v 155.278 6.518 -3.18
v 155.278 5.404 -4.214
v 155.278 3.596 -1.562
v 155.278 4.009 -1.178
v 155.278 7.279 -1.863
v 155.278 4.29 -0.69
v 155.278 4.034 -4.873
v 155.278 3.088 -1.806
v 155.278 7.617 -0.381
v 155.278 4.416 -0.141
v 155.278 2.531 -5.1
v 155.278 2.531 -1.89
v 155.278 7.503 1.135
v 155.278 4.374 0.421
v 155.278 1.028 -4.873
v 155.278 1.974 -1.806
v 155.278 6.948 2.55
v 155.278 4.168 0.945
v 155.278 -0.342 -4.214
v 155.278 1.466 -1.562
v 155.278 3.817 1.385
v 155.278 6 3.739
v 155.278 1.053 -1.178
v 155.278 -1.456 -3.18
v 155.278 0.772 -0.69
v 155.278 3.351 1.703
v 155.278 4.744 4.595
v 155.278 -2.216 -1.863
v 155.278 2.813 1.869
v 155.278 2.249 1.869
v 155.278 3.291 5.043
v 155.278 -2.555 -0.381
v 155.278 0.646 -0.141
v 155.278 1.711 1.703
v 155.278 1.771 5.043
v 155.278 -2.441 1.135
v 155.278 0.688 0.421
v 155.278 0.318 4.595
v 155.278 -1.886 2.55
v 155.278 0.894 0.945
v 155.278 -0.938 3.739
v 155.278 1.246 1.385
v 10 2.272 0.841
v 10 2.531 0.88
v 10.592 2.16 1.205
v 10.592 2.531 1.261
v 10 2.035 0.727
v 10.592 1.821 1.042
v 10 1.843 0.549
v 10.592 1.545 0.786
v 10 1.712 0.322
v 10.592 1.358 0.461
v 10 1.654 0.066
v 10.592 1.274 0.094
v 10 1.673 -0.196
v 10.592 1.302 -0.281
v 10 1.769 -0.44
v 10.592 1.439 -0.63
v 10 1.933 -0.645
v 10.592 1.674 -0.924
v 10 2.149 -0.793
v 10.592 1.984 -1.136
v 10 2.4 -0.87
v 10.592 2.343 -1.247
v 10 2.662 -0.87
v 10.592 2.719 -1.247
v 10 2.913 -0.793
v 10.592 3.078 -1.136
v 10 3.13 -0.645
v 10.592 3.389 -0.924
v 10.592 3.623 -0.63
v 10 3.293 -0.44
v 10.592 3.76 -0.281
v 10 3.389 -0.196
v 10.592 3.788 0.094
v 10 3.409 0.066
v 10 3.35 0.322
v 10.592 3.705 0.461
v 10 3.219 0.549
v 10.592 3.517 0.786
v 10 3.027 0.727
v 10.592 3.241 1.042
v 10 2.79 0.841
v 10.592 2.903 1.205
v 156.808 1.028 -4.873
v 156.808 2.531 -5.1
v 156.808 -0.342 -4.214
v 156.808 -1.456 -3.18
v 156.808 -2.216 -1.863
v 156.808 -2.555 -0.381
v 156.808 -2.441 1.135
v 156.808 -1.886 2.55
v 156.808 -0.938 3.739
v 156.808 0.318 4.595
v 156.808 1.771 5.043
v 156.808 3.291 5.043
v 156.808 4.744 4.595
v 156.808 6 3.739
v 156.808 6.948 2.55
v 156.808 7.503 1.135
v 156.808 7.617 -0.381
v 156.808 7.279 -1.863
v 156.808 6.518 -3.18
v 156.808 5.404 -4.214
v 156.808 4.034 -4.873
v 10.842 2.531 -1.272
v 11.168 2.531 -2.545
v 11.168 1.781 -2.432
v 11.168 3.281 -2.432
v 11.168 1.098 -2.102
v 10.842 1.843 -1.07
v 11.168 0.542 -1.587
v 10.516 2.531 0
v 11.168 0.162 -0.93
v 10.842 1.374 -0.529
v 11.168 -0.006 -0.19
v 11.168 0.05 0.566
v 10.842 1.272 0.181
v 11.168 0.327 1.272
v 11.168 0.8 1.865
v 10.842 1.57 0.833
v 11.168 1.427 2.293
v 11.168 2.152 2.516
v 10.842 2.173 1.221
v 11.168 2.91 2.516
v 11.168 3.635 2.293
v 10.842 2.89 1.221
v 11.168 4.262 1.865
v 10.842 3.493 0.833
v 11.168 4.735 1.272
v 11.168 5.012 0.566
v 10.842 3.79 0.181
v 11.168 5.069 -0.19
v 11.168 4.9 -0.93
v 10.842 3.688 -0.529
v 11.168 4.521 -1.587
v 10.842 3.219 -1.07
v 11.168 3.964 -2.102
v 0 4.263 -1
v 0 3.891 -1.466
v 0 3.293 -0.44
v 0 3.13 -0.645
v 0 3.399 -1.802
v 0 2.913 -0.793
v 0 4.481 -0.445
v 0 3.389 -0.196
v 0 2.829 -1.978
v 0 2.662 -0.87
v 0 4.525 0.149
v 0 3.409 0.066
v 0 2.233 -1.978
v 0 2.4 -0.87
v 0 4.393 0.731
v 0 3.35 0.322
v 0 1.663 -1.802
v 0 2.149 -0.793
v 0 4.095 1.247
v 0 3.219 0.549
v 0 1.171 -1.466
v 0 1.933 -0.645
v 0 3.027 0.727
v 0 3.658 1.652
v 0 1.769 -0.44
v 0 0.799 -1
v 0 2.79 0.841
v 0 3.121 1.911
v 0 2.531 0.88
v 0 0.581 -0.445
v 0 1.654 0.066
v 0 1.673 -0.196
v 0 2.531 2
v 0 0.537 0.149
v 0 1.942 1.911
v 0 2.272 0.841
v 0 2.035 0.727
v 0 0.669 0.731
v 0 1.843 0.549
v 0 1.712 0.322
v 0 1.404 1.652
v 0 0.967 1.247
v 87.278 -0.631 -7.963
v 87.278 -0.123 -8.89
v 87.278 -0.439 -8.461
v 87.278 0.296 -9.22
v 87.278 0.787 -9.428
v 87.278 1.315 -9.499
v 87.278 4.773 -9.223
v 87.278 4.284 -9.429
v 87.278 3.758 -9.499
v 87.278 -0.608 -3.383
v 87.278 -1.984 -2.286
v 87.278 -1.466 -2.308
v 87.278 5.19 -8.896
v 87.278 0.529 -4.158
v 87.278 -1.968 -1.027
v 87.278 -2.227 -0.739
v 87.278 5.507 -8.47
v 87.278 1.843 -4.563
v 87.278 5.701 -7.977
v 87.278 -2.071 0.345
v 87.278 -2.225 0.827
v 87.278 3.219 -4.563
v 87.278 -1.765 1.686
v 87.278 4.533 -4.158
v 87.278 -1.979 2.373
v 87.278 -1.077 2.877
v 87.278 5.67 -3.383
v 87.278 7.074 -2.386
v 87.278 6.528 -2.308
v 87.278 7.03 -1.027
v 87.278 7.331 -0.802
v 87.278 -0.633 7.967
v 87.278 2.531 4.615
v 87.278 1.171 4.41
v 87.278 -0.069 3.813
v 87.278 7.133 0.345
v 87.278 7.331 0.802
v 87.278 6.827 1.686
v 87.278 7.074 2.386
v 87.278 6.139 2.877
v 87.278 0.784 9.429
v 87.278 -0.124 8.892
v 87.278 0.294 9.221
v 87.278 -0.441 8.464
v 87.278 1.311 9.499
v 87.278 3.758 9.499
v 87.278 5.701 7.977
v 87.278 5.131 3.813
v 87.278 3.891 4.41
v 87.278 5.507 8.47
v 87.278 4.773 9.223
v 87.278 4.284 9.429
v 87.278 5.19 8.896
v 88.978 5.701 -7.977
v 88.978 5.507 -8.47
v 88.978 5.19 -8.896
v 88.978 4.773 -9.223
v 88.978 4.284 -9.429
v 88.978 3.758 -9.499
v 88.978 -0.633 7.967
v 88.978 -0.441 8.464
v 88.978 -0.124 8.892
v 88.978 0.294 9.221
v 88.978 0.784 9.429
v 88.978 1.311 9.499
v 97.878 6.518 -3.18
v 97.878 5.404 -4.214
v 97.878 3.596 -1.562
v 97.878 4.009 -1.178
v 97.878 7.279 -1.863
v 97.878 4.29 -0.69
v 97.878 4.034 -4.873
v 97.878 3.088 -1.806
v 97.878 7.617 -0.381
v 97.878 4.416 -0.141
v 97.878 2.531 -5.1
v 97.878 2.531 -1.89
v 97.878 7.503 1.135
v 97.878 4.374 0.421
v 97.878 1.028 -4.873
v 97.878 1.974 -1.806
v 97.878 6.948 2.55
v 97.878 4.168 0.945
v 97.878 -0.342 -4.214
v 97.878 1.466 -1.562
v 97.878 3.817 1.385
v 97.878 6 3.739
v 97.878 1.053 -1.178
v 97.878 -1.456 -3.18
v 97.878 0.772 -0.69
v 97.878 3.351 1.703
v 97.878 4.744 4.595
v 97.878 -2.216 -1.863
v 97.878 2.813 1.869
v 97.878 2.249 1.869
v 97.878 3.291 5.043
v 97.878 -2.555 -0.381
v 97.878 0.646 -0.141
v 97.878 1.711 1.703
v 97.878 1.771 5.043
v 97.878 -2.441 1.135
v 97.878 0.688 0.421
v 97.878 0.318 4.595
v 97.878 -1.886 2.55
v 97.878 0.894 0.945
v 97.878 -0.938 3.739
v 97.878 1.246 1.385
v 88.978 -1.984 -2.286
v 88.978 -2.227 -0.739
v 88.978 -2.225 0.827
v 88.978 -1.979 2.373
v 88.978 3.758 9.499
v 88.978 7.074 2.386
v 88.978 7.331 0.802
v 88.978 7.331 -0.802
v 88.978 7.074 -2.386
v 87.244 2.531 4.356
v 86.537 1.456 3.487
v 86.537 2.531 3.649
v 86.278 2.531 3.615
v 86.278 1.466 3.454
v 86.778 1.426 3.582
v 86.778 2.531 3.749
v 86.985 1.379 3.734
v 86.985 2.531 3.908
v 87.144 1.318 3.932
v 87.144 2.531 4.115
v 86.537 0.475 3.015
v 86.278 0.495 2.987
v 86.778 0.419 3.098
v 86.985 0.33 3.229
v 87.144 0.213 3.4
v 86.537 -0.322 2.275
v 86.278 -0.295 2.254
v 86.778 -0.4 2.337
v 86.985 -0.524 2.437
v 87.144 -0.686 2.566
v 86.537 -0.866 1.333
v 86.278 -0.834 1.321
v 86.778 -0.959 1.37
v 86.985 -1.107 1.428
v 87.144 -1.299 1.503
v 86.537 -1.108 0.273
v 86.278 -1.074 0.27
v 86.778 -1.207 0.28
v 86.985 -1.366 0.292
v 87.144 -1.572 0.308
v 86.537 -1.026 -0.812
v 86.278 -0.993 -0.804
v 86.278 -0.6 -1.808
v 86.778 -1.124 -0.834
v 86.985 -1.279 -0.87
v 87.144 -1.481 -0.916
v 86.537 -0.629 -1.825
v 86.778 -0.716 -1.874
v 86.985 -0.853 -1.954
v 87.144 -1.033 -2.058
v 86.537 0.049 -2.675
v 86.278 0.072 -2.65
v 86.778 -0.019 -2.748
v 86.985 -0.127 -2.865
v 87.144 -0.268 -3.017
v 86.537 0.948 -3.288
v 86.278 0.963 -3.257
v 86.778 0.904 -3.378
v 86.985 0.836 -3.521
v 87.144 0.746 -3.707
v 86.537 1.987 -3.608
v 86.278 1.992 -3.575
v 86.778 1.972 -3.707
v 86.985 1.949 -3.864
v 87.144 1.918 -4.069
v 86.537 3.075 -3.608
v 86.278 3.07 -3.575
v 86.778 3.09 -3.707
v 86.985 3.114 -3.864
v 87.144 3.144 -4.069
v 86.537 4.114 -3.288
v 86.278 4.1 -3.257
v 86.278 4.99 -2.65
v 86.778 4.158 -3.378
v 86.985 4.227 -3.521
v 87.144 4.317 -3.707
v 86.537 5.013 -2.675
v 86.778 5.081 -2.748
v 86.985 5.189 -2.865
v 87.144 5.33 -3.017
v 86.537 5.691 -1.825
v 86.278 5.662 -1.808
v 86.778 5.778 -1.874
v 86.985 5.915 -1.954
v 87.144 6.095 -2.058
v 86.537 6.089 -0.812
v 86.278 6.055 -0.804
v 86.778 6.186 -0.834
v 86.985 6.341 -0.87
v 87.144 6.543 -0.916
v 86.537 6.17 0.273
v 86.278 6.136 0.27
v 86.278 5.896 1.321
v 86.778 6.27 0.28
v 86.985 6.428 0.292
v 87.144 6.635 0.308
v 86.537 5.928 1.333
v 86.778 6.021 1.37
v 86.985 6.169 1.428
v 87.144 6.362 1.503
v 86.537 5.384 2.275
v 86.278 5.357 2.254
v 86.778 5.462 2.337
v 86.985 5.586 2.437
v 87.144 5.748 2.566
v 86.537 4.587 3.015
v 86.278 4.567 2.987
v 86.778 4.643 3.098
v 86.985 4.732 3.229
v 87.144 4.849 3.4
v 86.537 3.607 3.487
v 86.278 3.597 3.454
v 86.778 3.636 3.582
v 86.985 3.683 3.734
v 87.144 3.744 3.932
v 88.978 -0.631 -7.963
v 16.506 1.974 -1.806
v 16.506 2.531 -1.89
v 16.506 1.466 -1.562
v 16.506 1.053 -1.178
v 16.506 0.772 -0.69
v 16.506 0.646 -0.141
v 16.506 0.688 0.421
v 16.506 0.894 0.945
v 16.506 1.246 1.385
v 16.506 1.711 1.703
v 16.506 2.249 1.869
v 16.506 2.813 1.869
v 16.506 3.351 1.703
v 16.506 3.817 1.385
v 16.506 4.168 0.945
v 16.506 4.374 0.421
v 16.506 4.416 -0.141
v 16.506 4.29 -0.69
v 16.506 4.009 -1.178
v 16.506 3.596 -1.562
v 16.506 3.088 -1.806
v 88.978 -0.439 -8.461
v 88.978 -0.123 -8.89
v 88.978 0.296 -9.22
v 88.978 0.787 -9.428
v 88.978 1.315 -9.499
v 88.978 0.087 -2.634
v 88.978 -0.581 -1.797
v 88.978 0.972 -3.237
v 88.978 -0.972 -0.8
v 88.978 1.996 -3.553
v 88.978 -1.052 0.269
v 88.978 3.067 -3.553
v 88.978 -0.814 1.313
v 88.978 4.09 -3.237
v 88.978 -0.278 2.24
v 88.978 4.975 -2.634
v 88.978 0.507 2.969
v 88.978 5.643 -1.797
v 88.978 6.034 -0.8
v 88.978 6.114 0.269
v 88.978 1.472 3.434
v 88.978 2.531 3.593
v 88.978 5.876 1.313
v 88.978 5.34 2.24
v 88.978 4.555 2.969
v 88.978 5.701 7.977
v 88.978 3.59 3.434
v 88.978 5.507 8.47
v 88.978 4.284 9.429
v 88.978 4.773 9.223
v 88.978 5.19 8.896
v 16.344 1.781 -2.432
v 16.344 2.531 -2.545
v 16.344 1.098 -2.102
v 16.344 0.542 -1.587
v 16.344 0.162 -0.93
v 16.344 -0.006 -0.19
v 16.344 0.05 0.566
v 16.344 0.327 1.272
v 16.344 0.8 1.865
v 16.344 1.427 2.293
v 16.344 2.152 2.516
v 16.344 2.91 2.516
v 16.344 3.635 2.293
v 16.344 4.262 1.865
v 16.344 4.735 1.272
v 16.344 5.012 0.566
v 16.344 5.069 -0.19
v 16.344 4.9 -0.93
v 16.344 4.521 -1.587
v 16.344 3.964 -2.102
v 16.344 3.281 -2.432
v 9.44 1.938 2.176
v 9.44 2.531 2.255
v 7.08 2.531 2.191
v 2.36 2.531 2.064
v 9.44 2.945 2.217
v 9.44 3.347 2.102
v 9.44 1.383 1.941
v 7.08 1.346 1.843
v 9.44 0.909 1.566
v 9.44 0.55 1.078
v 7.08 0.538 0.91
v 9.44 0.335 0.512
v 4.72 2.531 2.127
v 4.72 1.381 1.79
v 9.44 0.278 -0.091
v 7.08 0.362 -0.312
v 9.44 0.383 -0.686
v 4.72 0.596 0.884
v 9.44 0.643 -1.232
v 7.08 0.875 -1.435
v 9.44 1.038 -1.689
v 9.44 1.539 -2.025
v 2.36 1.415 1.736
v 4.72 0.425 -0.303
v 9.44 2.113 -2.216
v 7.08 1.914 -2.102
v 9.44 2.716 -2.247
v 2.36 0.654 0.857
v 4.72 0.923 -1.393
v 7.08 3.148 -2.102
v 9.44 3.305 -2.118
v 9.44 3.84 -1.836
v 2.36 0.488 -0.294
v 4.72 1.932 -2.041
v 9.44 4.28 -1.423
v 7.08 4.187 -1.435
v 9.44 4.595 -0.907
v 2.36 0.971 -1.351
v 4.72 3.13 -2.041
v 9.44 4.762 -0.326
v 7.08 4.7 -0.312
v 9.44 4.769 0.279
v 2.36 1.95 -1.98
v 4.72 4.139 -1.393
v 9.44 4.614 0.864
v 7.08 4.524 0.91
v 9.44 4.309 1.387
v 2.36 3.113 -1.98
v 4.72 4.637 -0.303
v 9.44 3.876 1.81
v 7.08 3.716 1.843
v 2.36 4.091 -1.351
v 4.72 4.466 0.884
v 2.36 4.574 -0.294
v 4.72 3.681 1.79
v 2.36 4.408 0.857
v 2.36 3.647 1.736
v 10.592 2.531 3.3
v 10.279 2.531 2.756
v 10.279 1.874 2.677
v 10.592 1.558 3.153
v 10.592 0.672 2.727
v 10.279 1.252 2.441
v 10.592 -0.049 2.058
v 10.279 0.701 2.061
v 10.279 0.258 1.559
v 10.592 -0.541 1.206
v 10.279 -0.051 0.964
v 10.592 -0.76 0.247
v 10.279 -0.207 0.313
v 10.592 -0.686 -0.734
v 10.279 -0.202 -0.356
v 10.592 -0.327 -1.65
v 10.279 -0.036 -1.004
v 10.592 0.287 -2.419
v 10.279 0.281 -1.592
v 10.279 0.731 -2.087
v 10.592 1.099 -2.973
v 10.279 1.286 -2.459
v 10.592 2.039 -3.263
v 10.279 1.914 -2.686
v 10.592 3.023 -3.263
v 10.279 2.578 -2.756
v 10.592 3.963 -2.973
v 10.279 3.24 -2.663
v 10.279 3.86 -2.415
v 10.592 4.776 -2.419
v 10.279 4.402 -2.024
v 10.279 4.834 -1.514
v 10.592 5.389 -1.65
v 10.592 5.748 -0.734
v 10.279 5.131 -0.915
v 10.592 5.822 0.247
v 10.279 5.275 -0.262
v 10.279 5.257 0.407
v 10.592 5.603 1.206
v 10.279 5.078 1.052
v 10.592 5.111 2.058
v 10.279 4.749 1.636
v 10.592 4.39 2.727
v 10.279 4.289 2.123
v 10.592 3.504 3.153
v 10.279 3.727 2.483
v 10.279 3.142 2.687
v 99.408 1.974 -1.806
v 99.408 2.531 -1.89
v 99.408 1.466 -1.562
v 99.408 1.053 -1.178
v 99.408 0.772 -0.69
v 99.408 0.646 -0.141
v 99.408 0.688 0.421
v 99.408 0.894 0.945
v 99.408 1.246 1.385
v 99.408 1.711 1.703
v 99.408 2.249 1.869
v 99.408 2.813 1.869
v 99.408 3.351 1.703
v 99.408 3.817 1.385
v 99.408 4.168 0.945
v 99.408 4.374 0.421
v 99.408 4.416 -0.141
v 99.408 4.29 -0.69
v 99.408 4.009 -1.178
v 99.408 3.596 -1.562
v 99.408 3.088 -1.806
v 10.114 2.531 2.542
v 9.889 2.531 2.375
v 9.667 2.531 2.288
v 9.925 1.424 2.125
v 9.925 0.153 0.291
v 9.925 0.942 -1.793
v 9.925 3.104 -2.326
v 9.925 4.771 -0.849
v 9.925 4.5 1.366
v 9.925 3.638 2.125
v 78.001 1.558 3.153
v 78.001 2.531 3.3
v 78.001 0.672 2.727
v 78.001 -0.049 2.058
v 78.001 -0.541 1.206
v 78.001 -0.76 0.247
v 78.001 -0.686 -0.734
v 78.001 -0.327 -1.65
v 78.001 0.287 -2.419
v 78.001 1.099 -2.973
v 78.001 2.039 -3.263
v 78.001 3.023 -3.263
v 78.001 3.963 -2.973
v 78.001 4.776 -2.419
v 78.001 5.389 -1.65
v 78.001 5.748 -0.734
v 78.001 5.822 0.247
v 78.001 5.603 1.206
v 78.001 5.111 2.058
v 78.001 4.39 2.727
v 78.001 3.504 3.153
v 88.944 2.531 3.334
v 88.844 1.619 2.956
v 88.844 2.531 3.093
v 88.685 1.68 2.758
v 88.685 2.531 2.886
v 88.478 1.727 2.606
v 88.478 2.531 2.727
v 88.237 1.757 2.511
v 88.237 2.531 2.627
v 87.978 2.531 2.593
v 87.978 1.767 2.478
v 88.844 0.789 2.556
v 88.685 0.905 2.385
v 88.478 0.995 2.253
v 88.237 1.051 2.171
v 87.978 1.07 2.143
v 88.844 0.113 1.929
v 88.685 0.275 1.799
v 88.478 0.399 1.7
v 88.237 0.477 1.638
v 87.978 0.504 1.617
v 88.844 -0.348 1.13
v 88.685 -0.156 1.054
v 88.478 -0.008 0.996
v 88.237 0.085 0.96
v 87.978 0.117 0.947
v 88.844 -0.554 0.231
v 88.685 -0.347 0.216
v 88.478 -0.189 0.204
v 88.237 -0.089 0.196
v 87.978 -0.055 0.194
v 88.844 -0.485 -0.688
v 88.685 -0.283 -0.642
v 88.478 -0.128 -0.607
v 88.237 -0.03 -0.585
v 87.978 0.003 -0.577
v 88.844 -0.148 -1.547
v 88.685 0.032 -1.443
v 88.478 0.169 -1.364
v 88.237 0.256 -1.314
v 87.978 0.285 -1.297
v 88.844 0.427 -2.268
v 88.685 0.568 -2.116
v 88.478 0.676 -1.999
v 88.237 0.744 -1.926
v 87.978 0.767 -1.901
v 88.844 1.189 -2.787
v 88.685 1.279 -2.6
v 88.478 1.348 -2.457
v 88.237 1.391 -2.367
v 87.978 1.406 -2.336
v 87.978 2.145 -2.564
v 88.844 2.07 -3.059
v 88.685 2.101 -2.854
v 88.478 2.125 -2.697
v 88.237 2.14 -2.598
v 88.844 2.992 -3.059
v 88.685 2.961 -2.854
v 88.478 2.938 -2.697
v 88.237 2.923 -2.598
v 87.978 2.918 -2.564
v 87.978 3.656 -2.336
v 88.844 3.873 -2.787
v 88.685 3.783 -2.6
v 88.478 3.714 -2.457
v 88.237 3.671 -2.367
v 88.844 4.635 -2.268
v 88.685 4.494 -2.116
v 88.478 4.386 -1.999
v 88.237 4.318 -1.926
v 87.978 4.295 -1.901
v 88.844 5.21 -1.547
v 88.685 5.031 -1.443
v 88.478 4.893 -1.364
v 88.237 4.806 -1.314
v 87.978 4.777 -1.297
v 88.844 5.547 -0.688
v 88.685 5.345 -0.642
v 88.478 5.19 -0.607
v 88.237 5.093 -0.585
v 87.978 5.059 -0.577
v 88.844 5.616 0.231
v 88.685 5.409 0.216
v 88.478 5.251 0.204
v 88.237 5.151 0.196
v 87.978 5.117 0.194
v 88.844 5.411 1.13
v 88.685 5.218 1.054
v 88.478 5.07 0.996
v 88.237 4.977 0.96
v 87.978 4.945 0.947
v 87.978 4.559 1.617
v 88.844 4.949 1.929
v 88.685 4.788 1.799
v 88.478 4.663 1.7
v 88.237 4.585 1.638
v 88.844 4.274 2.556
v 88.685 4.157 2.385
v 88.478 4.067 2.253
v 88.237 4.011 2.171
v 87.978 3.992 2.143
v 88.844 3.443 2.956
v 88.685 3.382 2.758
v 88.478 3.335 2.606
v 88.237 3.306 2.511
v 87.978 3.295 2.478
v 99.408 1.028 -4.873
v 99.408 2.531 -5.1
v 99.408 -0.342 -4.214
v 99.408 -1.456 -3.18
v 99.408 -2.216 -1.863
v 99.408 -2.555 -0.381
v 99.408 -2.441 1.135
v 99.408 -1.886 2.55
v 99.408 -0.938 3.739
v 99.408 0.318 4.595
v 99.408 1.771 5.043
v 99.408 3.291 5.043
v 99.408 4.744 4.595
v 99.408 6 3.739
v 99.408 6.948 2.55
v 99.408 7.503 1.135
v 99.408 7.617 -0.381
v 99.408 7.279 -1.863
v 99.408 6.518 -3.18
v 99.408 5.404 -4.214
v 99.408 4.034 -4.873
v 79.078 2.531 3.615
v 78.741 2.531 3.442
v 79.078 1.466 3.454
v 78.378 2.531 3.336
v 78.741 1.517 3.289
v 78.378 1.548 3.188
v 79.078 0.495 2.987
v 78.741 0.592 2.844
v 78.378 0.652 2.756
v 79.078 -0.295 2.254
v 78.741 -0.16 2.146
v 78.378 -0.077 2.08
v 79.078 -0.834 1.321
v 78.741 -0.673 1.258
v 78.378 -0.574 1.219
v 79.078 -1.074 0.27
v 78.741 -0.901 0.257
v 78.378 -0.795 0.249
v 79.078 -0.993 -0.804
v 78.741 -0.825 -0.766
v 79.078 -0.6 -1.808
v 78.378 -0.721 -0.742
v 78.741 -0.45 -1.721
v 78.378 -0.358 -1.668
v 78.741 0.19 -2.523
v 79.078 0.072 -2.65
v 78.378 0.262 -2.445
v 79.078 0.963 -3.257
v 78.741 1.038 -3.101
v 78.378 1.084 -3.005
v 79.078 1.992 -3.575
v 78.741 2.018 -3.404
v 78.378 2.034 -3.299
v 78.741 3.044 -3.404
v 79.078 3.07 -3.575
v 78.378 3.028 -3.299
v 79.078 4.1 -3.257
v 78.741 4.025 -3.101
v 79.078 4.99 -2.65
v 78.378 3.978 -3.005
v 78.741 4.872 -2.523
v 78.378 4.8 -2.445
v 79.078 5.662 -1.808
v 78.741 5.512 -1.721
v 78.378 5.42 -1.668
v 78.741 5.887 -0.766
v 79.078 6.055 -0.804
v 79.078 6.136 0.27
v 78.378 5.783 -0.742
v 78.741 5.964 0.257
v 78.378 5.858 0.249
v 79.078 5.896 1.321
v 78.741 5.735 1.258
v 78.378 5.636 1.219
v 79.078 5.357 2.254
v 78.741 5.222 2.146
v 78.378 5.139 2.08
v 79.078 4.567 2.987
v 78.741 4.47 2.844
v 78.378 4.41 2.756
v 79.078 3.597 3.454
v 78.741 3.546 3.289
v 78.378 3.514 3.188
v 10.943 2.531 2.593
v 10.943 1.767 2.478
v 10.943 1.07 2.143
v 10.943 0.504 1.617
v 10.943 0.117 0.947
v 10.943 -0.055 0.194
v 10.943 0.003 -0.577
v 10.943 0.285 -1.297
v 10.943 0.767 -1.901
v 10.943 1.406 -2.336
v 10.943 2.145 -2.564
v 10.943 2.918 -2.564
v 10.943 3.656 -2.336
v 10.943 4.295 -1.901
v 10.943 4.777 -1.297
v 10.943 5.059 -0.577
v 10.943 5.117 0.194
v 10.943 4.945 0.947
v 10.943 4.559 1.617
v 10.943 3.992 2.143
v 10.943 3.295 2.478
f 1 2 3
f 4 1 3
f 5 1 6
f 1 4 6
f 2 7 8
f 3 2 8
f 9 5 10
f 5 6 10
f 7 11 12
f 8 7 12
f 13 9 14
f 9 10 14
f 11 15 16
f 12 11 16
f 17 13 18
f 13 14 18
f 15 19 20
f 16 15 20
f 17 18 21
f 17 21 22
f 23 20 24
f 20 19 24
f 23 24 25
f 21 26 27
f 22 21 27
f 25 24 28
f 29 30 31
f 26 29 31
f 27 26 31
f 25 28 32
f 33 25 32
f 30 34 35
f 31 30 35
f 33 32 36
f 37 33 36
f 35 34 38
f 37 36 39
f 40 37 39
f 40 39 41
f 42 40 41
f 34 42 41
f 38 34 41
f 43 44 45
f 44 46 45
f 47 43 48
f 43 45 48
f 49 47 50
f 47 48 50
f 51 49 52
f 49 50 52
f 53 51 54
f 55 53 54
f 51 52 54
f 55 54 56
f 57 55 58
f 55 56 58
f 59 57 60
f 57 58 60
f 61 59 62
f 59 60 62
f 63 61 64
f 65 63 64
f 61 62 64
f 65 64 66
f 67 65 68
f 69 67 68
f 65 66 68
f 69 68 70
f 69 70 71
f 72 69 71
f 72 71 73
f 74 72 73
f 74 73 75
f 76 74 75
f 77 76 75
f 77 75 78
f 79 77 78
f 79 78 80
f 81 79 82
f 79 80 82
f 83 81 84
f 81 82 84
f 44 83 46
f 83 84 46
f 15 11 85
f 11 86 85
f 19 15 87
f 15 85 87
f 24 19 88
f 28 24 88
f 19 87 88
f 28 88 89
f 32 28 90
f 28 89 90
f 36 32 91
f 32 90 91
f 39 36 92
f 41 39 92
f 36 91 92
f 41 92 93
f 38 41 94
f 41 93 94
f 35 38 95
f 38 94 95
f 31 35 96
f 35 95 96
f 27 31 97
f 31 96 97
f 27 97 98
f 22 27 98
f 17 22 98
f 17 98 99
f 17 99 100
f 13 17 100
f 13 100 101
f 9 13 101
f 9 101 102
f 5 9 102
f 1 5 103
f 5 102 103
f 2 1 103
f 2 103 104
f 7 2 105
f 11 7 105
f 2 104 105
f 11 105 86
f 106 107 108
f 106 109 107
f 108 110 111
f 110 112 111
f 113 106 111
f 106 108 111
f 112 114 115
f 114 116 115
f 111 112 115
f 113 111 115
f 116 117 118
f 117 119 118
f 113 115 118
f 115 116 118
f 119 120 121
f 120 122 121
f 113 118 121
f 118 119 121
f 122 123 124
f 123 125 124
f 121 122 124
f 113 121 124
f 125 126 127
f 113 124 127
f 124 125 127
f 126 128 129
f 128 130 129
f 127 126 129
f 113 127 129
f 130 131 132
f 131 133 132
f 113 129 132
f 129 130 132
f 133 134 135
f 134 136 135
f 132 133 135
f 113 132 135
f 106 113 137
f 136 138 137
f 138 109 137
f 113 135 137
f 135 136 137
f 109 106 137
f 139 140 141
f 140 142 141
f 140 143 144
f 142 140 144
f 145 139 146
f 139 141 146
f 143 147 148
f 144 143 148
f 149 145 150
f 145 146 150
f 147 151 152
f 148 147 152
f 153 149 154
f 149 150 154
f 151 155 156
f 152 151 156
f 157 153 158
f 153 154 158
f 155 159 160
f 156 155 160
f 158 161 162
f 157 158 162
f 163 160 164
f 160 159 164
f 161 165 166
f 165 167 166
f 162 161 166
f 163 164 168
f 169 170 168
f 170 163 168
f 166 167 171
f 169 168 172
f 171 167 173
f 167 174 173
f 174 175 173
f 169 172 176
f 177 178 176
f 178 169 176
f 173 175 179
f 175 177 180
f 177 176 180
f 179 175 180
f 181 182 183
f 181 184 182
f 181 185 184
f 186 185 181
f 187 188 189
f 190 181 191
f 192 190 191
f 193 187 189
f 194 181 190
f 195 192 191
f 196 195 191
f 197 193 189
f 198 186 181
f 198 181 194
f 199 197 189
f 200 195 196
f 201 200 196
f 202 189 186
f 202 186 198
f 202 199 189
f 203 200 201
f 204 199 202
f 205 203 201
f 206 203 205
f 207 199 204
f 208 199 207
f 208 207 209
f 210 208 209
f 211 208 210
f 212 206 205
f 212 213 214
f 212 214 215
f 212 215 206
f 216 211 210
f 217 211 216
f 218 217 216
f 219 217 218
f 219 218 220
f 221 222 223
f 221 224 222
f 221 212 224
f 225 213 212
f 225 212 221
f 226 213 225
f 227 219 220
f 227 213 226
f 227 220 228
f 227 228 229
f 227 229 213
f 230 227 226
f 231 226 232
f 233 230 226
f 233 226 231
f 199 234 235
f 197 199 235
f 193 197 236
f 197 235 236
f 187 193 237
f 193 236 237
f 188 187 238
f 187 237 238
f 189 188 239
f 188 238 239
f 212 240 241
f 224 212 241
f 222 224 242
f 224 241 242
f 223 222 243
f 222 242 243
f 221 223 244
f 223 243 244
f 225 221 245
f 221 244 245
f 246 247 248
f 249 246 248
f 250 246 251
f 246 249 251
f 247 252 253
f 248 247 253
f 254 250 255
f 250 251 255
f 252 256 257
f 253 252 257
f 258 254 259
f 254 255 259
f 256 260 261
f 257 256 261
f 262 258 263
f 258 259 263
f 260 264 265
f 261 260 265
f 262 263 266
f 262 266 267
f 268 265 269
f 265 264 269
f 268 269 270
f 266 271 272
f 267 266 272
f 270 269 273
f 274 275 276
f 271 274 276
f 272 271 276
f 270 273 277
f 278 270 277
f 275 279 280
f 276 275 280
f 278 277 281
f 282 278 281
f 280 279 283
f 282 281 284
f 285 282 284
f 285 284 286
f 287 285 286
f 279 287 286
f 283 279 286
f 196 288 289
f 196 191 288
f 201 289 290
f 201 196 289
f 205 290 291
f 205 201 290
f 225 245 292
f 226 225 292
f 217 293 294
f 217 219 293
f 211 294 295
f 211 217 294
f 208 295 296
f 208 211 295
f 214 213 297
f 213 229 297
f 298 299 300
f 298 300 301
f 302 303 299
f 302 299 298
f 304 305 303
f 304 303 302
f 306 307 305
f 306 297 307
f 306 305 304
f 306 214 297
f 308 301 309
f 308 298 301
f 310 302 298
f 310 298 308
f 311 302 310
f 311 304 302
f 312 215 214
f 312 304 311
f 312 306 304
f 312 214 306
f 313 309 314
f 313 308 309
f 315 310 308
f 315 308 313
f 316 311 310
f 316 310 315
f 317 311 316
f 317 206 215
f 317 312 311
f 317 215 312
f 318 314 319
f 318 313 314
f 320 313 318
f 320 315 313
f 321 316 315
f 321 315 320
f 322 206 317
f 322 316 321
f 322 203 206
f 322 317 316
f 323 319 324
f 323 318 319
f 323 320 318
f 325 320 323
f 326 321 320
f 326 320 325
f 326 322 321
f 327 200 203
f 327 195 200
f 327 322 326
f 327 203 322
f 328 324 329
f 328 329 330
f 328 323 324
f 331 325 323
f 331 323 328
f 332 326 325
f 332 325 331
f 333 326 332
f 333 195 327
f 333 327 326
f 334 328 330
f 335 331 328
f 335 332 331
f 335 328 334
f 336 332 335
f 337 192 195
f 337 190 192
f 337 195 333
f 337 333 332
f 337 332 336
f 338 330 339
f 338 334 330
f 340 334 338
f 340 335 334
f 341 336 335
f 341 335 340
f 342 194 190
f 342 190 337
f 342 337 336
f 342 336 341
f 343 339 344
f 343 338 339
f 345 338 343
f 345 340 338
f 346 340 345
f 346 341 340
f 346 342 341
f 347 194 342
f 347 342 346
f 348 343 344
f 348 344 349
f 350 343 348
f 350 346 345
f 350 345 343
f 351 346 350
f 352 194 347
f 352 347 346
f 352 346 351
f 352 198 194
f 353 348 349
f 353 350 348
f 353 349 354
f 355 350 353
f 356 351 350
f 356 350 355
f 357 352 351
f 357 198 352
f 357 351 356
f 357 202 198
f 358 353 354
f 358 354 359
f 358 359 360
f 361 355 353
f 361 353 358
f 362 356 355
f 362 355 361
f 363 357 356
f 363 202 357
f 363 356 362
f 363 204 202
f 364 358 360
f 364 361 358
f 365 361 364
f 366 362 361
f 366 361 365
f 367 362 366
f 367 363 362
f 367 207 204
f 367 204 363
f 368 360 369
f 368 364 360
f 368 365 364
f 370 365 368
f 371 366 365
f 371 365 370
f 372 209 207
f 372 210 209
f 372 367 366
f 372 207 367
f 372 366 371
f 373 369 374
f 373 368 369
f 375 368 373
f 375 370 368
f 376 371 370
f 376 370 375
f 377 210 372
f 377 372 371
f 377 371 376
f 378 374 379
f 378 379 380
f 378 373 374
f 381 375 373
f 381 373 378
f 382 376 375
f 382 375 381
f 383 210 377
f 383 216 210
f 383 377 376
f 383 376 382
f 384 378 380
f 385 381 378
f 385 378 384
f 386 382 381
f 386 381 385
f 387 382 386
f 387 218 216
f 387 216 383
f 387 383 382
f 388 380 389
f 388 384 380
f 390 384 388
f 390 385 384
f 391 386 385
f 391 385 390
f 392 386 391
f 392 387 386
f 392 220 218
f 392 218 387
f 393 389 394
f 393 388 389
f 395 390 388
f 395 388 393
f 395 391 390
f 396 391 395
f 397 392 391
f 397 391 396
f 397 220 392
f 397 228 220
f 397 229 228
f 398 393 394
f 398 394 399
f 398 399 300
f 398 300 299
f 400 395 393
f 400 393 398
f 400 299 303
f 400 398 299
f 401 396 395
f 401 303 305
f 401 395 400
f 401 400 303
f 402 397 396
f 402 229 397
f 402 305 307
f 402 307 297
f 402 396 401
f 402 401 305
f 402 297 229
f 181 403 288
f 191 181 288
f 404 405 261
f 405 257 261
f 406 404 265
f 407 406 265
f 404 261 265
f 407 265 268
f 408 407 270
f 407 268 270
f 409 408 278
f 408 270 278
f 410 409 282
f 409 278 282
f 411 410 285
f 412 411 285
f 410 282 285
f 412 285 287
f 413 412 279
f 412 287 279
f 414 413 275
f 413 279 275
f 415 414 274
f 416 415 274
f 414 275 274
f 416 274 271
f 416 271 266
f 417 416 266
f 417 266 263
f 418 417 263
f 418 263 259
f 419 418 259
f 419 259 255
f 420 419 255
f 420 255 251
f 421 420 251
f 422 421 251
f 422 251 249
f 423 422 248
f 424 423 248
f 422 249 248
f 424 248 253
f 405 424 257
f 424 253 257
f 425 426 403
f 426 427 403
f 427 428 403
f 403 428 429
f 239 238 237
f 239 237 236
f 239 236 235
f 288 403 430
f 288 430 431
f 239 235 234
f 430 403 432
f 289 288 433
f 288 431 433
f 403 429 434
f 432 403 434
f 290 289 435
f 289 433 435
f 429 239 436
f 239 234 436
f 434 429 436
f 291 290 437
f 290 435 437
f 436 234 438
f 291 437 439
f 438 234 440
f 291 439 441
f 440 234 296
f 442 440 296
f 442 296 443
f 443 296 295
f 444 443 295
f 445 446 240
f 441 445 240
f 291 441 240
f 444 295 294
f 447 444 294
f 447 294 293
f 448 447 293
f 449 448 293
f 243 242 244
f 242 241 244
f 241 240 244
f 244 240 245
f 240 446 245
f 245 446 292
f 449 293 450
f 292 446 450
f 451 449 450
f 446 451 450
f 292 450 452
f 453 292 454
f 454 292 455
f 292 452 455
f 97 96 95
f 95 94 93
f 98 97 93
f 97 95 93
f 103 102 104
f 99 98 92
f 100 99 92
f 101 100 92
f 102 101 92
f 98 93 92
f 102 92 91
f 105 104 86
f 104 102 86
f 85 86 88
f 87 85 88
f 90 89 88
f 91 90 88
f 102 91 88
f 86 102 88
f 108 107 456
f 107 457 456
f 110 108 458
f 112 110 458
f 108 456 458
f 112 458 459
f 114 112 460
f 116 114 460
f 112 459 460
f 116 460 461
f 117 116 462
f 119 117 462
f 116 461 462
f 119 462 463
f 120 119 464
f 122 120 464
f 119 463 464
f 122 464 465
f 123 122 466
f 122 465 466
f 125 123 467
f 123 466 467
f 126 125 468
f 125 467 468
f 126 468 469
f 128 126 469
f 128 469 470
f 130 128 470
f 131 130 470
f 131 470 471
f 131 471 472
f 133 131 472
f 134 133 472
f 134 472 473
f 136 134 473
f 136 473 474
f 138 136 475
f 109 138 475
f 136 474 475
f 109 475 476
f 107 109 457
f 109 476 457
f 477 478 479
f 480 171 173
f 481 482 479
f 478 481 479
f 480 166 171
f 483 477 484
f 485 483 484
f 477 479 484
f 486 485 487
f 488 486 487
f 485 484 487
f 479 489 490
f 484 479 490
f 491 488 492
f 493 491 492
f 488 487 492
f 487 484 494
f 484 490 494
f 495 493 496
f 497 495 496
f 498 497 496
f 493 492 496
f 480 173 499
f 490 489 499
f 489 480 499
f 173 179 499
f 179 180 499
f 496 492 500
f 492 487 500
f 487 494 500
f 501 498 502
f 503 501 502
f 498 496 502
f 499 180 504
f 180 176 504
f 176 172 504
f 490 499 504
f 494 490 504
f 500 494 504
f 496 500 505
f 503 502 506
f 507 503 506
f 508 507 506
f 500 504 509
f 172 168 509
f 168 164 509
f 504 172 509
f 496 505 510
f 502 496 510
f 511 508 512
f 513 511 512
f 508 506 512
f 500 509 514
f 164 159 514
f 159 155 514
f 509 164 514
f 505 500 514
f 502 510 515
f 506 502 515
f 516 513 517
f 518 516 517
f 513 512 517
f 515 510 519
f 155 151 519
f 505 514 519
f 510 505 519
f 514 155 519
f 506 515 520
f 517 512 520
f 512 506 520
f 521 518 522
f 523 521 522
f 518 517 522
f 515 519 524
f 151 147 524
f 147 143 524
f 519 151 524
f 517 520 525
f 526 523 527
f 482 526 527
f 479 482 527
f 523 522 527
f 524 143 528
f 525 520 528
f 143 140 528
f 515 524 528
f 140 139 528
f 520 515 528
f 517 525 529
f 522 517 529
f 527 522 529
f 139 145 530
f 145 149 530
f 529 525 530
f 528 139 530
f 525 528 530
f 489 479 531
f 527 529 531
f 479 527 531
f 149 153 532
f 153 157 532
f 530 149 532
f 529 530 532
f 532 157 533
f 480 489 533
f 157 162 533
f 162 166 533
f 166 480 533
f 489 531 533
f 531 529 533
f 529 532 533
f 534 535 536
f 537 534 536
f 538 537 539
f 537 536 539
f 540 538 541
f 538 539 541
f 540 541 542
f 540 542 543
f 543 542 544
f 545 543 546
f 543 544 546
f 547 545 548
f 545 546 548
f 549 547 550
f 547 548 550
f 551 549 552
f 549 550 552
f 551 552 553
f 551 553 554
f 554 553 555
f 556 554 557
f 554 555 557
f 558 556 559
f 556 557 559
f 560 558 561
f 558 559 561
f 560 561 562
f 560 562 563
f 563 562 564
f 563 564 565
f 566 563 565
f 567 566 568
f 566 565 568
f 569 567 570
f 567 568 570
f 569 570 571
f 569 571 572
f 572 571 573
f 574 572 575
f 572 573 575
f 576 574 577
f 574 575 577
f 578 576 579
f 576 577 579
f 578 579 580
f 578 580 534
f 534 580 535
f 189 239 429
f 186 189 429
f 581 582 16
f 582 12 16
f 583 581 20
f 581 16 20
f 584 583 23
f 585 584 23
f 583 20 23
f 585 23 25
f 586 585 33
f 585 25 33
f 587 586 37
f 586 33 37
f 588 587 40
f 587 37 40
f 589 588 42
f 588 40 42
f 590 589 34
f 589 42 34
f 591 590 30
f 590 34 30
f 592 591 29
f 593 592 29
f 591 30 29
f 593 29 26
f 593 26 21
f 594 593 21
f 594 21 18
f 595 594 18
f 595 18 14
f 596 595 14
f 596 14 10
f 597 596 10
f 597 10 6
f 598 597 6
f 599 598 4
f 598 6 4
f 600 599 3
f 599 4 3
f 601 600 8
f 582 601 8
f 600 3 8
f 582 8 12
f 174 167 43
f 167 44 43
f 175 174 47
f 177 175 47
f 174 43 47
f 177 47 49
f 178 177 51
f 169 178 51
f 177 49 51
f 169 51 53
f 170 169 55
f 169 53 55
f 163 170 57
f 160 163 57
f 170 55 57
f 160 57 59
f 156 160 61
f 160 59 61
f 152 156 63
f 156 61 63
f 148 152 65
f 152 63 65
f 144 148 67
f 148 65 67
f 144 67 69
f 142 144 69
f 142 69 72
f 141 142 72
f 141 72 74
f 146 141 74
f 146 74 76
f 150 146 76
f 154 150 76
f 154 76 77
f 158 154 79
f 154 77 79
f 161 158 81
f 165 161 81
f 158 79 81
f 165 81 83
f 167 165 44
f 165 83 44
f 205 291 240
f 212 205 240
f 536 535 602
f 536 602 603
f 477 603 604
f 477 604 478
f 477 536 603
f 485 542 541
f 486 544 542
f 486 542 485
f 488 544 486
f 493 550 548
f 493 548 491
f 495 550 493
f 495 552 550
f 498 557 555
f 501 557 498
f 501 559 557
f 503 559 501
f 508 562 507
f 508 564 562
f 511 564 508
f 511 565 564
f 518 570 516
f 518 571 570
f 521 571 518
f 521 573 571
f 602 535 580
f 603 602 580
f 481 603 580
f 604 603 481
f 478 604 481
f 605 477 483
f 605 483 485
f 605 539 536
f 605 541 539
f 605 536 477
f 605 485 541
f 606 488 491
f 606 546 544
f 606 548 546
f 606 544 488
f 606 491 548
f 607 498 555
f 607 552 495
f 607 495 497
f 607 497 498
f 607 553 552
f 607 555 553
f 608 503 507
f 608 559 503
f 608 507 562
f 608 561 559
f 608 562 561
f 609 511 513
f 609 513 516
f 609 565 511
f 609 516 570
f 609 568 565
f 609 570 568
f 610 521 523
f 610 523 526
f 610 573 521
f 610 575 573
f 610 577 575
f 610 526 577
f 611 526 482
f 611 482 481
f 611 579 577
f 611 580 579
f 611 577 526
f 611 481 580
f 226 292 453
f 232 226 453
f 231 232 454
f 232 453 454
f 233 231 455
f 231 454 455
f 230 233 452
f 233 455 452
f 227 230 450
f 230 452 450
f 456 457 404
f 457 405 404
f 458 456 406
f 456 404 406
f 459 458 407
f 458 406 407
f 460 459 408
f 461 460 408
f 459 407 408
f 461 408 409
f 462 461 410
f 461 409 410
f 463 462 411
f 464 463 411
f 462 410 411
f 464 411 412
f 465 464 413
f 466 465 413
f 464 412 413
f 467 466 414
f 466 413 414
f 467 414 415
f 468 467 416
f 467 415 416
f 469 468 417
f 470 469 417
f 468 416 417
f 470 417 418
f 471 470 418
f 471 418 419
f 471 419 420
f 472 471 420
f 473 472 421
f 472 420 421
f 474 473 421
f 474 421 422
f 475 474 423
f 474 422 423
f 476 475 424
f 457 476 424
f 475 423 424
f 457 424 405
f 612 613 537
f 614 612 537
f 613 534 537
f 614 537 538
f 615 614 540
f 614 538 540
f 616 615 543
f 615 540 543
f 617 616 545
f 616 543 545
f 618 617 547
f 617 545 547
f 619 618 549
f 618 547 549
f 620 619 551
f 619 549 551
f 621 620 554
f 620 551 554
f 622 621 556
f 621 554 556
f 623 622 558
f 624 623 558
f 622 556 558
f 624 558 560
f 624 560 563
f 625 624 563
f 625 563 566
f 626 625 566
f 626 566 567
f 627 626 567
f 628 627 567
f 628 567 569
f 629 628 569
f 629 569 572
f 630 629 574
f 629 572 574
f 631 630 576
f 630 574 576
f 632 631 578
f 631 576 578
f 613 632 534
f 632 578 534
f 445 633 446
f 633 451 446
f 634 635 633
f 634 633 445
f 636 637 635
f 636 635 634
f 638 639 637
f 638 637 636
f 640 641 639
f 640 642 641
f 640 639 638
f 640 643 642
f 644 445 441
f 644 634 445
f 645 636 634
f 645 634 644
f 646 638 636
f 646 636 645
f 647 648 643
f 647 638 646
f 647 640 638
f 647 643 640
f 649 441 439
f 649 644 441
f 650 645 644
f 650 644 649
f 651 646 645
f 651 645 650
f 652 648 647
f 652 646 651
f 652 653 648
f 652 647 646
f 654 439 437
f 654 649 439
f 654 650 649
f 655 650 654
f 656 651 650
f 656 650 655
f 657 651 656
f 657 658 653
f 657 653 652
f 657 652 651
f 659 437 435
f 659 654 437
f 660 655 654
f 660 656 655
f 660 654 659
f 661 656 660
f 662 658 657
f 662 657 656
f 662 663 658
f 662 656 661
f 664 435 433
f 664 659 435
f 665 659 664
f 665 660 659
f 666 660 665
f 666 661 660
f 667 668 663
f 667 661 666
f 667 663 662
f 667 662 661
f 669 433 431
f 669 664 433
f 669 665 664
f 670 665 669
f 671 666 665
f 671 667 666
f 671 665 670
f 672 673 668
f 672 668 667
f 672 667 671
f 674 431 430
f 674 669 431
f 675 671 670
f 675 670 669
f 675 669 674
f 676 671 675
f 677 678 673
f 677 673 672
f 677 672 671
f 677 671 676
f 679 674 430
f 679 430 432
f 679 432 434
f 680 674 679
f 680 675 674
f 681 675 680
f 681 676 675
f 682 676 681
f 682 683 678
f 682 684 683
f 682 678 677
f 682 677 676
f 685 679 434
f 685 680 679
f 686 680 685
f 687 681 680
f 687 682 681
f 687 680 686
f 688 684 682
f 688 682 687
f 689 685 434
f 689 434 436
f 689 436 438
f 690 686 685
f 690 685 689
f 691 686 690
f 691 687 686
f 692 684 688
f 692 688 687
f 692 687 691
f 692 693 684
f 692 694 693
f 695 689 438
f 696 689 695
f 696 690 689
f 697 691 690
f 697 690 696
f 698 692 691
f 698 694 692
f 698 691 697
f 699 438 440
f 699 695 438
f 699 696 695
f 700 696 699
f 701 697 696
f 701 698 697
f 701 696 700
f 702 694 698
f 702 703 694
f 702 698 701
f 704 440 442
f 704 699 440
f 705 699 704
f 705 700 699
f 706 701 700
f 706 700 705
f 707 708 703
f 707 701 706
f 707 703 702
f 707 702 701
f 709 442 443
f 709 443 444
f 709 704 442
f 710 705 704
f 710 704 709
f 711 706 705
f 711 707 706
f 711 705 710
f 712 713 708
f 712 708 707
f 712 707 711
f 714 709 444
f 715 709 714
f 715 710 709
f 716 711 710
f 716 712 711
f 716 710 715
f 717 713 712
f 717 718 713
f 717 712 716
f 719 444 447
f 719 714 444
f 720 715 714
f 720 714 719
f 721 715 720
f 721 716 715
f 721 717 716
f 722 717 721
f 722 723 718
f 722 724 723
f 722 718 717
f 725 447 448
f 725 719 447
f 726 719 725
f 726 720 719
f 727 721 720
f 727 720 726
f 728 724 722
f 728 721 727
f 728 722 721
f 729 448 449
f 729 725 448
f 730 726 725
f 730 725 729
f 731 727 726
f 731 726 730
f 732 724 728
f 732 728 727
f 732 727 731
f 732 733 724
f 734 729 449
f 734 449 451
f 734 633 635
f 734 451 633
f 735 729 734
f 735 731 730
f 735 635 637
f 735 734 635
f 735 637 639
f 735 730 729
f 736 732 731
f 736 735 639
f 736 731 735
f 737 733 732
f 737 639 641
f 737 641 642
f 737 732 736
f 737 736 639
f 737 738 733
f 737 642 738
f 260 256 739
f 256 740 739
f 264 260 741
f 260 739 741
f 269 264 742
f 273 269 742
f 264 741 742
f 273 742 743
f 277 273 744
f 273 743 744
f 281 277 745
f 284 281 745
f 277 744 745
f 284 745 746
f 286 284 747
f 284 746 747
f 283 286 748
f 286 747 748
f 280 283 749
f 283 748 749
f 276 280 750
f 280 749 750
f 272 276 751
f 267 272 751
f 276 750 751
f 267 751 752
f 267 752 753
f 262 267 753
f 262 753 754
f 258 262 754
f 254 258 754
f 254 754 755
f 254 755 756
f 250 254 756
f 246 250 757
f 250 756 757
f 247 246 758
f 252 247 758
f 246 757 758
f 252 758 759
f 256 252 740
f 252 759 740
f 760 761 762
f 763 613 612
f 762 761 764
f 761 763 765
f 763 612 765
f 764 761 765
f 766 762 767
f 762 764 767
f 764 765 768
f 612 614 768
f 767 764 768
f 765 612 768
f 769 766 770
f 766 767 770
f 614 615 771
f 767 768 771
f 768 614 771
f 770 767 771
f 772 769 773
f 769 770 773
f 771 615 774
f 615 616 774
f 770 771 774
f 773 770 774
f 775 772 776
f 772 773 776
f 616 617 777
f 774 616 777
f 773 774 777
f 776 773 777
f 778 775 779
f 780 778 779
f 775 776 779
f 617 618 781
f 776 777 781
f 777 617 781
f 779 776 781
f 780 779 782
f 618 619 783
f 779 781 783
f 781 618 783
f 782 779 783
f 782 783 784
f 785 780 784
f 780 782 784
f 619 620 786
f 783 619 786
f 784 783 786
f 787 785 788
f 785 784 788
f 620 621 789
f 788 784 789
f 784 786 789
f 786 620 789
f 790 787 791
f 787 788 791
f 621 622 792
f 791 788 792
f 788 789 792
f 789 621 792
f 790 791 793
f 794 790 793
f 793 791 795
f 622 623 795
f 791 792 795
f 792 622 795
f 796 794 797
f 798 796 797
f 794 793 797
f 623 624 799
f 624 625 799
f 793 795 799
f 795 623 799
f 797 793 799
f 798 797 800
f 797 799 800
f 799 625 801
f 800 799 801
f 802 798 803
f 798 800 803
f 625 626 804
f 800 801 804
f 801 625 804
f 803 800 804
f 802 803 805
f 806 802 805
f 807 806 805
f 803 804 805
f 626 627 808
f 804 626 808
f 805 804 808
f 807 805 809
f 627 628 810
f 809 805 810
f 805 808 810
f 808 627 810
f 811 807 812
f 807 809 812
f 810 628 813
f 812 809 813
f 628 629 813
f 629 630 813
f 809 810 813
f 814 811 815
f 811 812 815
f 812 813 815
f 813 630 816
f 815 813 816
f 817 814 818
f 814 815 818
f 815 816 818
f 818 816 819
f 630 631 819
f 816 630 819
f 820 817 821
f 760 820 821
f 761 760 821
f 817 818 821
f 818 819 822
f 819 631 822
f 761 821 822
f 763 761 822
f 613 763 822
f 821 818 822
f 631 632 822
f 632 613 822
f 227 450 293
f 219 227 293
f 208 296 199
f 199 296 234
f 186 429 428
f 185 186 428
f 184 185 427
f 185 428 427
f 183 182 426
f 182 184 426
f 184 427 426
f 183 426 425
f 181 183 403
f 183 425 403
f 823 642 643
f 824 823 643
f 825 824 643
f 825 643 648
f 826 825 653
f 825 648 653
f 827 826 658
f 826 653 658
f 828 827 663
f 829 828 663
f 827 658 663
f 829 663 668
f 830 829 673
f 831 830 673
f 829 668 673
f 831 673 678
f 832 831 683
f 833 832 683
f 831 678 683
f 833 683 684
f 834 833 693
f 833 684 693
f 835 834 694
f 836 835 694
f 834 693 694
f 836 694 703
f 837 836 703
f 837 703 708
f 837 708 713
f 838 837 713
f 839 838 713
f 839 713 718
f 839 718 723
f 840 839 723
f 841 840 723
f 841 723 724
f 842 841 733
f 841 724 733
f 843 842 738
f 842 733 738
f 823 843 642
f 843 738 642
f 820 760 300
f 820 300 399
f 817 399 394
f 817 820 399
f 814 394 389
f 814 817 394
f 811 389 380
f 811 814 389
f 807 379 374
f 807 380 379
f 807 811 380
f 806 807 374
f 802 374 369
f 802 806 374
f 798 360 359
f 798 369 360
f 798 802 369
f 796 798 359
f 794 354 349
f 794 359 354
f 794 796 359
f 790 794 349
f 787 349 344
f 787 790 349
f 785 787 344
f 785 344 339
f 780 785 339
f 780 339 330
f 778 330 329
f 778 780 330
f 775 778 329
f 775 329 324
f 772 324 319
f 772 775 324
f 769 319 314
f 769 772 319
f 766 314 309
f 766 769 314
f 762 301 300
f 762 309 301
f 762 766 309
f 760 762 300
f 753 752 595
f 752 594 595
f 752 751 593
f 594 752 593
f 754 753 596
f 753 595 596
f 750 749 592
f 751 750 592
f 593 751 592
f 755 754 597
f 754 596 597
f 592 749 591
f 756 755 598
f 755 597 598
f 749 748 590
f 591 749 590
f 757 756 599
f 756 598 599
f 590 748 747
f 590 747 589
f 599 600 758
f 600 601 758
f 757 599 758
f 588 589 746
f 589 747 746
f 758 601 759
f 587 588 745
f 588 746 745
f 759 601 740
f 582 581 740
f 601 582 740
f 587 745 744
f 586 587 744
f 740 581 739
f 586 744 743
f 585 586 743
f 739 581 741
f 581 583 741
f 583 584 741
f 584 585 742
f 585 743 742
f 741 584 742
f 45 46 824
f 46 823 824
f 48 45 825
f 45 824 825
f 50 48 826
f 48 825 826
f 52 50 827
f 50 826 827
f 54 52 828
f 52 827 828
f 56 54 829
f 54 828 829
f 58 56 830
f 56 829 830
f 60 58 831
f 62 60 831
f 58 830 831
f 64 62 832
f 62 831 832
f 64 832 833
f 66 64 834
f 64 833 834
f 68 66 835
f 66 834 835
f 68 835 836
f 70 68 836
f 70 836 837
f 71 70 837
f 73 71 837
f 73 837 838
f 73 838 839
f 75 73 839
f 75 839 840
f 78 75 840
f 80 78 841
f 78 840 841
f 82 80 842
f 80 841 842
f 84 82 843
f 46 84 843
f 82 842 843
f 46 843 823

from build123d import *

# Parameters (mm, degrees)
BOSS_EXTRUDE1_START = 1.7
SKETCH3_R           = 2.593243827
BOSS_EXTRUDE1_DEPTH = 1.7
FILLET1_R           = 10
FILLET2_R           = 2
FILLET3_R           = 1


with BuildPart() as part:
    # Sketch1 → Revolve2 (revolve)
    with BuildSketch(Plane.XY, mode=Mode.PRIVATE) as revolve2_sk:
        Polygon((0, 3.41109089), (10, 3.41109089), (10.592218891, 3.791734015), (10.943346142, 5.124334717), (87.2781258, 5.124334717), (87.2781258, 6.14609089), (79.0781258, 6.14609089), (78.592218891, 5.83109089), (10.592218891, 5.83109089), (10, 4.80109089), (0, 4.53109089), align=None)
    revolve(revolve2_sk.sketch.rotate(Axis((0, 2.53109089, 0), (1, 0, 0)), 90), axis=Axis((0, 2.53109089, 0), (1, 0, 0)))

    # Sketch3 → Boss-Extrude1 (add)
    with BuildSketch(Plane(origin=(87.2781258, 0, 0), x_dir=(0, 0, -1), z_dir=(1, 0, 0)).offset(BOSS_EXTRUDE1_START)):
        Polygon((-9.499358108, 5.326551853), (0, 7.660573112), (9.499358108, 5.326551853), (9.499358108, -0.264370073), (-0.044115668, -2.539426888), (-9.499358108, -0.264370073), align=None)
        with Locations(Location((0, 2.53109089, 0), (0, 0, 180))):
            Circle(SKETCH3_R, mode=Mode.SUBTRACT)
    extrude(amount=-BOSS_EXTRUDE1_DEPTH)

    # Fillet1
    fillet1_edges = [part.edges().sort_by_distance(p)[0] for p in [
        (88.1281258, 7.660573112, 0),
        (88.1281258, -2.539426888, 0.044115668),
    ]]
    fillet(fillet1_edges, radius=FILLET1_R)

    # Fillet2
    # the kernel refuses this fillet: 2 mm, written as the material it adds along each edge
    with BuildSketch(Plane(origin=(78.592218891, 2.53109089, 0), x_dir=(0, 0, 1), z_dir=(0, 1, 0))) as fillet2_piece_1_section:
        with BuildLine():
            CenterArc((3.3 + FILLET2_R, -FILLET2_R * 0.295779032627), FILLET2_R, 147.045775179, 32.954224821)
            Line((3.3, -FILLET2_R * 0.295779032627), (3.3, 0))
            Line((3.3, 0), (3.3 + FILLET2_R * 0.160894572606, FILLET2_R * 0.248189791587))
        make_face()
    fillet2_piece_1 = revolve(axis=Axis((78.592218891, 2.53109089, 0), (1, 0, 0)), mode=Mode.PRIVATE)
    fillet2_piece_1 = fillet2_piece_1 & Plane(origin=(78.565259798, 2.53109089, 0), x_dir=(0, 0, 1), z_dir=(-1, 0, 0)) * Cylinder(3.615, 15, mode=Mode.PRIVATE)
    add(fillet2_piece_1)
    # the kernel refuses this fillet: 2 mm, written as the material it takes off along each edge
    with BuildSketch(Plane(origin=(92.926291949, -0.264370073, -9.499358108), x_dir=(0, 1, 0), z_dir=(-1, 0, 0))) as fillet2_2_piece_1:
        with BuildLine():
            CenterArc((FILLET2_R * 0.789633229804, -FILLET2_R), FILLET2_R, 90, 76.591588328)
            Line((-FILLET2_R * 0.183108614693, -FILLET2_R * 0.768109284435), (0, 0))
            Line((0, 0), (FILLET2_R * 0.789633229804, 0))
        make_face()
    extrude(amount=9.596332298, mode=Mode.SUBTRACT)
    with BuildSketch(Plane(origin=(92.898323954, 5.326551853, -9.499358108), x_dir=(0, 0.23860626001544996, 0.9711163950224707), z_dir=(-1, 0, 0))) as fillet2_2_piece_2:
        with BuildLine():
            CenterArc((FILLET2_R * 0.784039630972, -FILLET2_R), FILLET2_R, 90, 76.195704702)
            Line((-FILLET2_R * 0.18707676405, -FILLET2_R * 0.761393739985), (0, 0))
            Line((0, 0), (FILLET2_R * 0.784039630972, 0))
        make_face()
    extrude(amount=9.54039631, mode=Mode.SUBTRACT)
    with BuildSketch(Plane(origin=(92.898323954, 5.326551853, 9.499358108), x_dir=(0, 0.23860626001544943, -0.9711163950224709), z_dir=(-1, 0, 0))) as fillet2_2_piece_3:
        with BuildLine():
            CenterArc((FILLET2_R * 0.784039630972, FILLET2_R), FILLET2_R, 193.804295298, 76.195704702)
            Line((-FILLET2_R * 0.18707676405, FILLET2_R * 0.761393739985), (0, 0))
            Line((0, 0), (FILLET2_R * 0.784039630972, 0))
        make_face()
    extrude(amount=9.54039631, mode=Mode.SUBTRACT)
    with BuildSketch(Plane(origin=(92.917759965, -0.264370073, 9.499358108), x_dir=(0, 1, 0), z_dir=(-1, 0, 0))) as fillet2_2_piece_4:
        with BuildLine():
            CenterArc((FILLET2_R * 0.787926833026, FILLET2_R), FILLET2_R, 193.528952804, 76.471047196)
            Line((-FILLET2_R * 0.184324998206, FILLET2_R * 0.766063306286), (0, 0))
            Line((0, 0), (FILLET2_R * 0.787926833026, 0))
        make_face()
    extrude(amount=9.57926833, mode=Mode.SUBTRACT)

    # Fillet3
    fillet3_edges = [part.edges().sort_by_distance(p)[0] for p in [
        (10, 2.53109089, -2.27),
        (87.2781258, 2.53109089, -3.615),
        (88.9781258, 2.53109089, -2.593243827),
    ]]
    fillet(fillet3_edges, radius=FILLET3_R)


with BuildPart() as body_2:
    # Sketch2 → Revolve3 (revolve)
    with BuildSketch(Plane.XY, mode=Mode.PRIVATE) as revolve3_sk:
        Polygon((10.515649659, 2.53109089), (11.168160759, 5.075645566), (16.344070093, 5.075645566), (16.50558566, 4.42109089), (97.8781258, 4.42109089), (97.8781258, 7.63109089), (99.4081258, 7.63109089), (99.4081258, 4.42109089), (155.2781258, 4.42109089), (155.2781258, 7.63109089), (156.8081258, 7.63109089), (156.8081258, 2.53109089), align=None)
    revolve(revolve3_sk.sketch.rotate(Axis((105.886554745, 2.53109089, 0), (-1, 0, 0)), 90), axis=Axis((105.886554745, 2.53109089, 0), (-1, 0, 0)))


solid = Compound([part.part, body_2.part])
